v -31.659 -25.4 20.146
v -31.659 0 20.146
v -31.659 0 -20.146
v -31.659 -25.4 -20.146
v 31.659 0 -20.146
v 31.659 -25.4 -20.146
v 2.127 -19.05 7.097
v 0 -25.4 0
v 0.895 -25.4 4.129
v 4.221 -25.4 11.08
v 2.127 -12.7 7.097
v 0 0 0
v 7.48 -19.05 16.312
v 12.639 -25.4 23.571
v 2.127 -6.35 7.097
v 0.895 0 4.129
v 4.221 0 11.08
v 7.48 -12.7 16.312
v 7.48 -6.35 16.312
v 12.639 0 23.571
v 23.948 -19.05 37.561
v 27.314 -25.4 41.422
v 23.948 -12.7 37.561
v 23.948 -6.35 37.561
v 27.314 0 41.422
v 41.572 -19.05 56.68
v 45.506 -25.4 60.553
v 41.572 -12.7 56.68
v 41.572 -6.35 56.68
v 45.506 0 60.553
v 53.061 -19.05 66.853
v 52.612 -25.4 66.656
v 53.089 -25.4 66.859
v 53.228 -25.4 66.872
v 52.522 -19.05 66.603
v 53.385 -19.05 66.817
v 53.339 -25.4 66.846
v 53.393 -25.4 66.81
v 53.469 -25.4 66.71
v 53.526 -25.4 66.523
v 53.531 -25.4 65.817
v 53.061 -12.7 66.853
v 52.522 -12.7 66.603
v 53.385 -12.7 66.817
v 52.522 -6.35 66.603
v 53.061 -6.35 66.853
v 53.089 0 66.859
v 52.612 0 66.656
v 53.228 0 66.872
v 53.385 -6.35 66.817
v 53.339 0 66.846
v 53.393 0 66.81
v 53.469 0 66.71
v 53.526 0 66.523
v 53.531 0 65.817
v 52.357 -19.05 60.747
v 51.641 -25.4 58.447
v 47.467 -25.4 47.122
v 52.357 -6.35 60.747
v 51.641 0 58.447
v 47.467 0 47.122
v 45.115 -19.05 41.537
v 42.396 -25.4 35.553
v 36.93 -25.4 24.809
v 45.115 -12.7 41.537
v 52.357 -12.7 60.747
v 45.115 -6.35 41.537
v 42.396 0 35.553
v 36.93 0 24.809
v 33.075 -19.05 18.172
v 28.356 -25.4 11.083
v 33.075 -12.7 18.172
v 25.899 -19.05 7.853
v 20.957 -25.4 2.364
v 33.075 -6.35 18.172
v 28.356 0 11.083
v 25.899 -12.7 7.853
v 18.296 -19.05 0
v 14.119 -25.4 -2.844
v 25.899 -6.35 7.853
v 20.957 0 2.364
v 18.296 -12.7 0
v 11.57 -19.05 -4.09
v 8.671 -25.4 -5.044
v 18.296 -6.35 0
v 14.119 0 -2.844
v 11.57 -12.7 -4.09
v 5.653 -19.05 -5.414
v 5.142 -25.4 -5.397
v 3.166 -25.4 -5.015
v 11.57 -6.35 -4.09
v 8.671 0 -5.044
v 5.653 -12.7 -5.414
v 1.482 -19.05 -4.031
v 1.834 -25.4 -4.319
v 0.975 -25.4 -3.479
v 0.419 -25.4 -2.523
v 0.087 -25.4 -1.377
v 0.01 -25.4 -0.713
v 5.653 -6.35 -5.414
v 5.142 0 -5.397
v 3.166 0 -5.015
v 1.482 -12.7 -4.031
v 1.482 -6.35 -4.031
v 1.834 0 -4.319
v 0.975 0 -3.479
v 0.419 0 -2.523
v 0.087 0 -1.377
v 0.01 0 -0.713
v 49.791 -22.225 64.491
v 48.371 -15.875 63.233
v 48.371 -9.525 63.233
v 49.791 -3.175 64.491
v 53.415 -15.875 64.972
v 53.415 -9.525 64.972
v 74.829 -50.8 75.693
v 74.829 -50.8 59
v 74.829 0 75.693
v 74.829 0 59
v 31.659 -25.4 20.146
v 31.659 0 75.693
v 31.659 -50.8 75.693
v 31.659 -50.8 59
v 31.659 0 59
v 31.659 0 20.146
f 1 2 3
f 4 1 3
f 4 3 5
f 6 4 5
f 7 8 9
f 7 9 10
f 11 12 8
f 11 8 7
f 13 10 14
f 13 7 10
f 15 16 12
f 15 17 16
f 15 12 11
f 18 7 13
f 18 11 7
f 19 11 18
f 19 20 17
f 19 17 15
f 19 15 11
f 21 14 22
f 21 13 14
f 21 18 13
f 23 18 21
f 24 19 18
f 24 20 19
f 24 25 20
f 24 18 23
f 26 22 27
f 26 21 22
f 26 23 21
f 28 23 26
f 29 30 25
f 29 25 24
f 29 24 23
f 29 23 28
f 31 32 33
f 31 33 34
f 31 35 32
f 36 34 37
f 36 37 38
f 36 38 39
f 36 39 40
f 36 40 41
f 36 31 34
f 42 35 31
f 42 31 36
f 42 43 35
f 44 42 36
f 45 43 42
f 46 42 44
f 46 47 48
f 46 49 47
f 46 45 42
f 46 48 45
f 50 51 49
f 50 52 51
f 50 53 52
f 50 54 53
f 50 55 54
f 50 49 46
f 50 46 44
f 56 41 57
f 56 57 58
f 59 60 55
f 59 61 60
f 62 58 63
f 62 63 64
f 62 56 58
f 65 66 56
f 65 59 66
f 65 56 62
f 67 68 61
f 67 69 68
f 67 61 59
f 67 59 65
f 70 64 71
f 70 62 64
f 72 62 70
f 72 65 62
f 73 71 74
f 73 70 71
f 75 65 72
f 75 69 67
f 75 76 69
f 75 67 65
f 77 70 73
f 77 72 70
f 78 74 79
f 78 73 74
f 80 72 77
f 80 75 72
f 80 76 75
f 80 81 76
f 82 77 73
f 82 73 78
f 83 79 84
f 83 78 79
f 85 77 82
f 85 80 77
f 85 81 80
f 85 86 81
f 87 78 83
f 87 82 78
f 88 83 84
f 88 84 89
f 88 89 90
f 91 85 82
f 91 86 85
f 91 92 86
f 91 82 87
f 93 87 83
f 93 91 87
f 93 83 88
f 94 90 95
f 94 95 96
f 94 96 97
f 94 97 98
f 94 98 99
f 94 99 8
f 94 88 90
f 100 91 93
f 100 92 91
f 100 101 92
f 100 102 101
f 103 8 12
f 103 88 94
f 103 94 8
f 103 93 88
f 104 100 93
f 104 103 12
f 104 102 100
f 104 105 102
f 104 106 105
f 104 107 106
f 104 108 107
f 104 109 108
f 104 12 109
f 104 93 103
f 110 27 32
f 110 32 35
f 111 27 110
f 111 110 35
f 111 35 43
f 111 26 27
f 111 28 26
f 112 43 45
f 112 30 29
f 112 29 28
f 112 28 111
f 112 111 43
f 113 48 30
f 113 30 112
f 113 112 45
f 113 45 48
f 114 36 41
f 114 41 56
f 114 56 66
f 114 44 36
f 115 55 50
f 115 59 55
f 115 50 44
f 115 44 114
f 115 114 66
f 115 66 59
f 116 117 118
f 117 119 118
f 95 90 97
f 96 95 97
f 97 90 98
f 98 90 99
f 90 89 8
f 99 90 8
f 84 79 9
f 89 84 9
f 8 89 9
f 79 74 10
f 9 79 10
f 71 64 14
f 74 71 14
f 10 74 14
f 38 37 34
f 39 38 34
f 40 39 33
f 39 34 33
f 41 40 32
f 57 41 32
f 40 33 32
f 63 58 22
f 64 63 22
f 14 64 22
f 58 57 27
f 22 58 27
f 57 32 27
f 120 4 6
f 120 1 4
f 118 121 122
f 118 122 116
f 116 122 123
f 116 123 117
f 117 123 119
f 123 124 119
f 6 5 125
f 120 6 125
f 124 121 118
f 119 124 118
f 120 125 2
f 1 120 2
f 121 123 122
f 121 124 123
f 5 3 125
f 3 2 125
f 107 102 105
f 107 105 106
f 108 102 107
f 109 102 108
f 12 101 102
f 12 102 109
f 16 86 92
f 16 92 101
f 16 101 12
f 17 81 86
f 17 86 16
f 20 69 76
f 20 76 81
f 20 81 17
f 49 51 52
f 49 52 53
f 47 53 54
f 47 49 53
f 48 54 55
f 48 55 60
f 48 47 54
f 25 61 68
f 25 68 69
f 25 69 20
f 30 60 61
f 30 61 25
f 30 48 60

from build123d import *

# Parameters (mm, degrees)
F1_DEPTH = 25.4
F0_W     = 43.1708618999
F0_H     = 16.6927278042
F2_DEPTH = 25.4
F4_DEPTH = 25.4


with BuildPart() as f1:
    # F0 (on Front) → F1 (new body)
    with BuildSketch(Plane.XZ):
        Polygon((-31.6586308181, -20.1464034617), (31.6586308181, -20.1464034617), (31.6586308181, 20.1464034617), (0, 20.1464034617), (-31.6586308181, 20.1464034617), align=None)
    extrude(amount=F1_DEPTH)


with BuildPart() as f1b:
    # F0 (on Front) → F1, piece 2 (new body)
    with BuildSketch(Plane.XZ):
        with Locations((53.2440617681, 67.3465430737)):
            Rectangle(F0_W, F0_H)
    extrude(amount=F1_DEPTH)

    # F2 (add): a face of the model
    f2_faces = [f1b.faces().sort_by_distance(p)[0] for p in [
        (53.2440617681, -25.4, 67.3465430737),
    ]]
    extrude(f2_faces, amount=F2_DEPTH)


with BuildPart() as f4:
    # F3 (on Front) → F4 (new body)
    with BuildSketch(Plane.XZ):
        with BuildLine():
            add(Edge.make_bspline(
                [(0, 0), (0.501768837, 15.3173342245), (50.9754407785, 67.9895437341), (55.6985837426, 66.0614461716), (28.3296785515, -7.7479942002), (-0.2330394037, -7.1139181448), (0, 0)],
                knots=[0, 0, 0, 0, 0.3971293615, 0.4419892978, 0.8155589132, 1, 1, 1, 1], degree=3))
        make_face()
    extrude(amount=F4_DEPTH)


solid = Compound([f1.part, f1b.part, f4.part])
